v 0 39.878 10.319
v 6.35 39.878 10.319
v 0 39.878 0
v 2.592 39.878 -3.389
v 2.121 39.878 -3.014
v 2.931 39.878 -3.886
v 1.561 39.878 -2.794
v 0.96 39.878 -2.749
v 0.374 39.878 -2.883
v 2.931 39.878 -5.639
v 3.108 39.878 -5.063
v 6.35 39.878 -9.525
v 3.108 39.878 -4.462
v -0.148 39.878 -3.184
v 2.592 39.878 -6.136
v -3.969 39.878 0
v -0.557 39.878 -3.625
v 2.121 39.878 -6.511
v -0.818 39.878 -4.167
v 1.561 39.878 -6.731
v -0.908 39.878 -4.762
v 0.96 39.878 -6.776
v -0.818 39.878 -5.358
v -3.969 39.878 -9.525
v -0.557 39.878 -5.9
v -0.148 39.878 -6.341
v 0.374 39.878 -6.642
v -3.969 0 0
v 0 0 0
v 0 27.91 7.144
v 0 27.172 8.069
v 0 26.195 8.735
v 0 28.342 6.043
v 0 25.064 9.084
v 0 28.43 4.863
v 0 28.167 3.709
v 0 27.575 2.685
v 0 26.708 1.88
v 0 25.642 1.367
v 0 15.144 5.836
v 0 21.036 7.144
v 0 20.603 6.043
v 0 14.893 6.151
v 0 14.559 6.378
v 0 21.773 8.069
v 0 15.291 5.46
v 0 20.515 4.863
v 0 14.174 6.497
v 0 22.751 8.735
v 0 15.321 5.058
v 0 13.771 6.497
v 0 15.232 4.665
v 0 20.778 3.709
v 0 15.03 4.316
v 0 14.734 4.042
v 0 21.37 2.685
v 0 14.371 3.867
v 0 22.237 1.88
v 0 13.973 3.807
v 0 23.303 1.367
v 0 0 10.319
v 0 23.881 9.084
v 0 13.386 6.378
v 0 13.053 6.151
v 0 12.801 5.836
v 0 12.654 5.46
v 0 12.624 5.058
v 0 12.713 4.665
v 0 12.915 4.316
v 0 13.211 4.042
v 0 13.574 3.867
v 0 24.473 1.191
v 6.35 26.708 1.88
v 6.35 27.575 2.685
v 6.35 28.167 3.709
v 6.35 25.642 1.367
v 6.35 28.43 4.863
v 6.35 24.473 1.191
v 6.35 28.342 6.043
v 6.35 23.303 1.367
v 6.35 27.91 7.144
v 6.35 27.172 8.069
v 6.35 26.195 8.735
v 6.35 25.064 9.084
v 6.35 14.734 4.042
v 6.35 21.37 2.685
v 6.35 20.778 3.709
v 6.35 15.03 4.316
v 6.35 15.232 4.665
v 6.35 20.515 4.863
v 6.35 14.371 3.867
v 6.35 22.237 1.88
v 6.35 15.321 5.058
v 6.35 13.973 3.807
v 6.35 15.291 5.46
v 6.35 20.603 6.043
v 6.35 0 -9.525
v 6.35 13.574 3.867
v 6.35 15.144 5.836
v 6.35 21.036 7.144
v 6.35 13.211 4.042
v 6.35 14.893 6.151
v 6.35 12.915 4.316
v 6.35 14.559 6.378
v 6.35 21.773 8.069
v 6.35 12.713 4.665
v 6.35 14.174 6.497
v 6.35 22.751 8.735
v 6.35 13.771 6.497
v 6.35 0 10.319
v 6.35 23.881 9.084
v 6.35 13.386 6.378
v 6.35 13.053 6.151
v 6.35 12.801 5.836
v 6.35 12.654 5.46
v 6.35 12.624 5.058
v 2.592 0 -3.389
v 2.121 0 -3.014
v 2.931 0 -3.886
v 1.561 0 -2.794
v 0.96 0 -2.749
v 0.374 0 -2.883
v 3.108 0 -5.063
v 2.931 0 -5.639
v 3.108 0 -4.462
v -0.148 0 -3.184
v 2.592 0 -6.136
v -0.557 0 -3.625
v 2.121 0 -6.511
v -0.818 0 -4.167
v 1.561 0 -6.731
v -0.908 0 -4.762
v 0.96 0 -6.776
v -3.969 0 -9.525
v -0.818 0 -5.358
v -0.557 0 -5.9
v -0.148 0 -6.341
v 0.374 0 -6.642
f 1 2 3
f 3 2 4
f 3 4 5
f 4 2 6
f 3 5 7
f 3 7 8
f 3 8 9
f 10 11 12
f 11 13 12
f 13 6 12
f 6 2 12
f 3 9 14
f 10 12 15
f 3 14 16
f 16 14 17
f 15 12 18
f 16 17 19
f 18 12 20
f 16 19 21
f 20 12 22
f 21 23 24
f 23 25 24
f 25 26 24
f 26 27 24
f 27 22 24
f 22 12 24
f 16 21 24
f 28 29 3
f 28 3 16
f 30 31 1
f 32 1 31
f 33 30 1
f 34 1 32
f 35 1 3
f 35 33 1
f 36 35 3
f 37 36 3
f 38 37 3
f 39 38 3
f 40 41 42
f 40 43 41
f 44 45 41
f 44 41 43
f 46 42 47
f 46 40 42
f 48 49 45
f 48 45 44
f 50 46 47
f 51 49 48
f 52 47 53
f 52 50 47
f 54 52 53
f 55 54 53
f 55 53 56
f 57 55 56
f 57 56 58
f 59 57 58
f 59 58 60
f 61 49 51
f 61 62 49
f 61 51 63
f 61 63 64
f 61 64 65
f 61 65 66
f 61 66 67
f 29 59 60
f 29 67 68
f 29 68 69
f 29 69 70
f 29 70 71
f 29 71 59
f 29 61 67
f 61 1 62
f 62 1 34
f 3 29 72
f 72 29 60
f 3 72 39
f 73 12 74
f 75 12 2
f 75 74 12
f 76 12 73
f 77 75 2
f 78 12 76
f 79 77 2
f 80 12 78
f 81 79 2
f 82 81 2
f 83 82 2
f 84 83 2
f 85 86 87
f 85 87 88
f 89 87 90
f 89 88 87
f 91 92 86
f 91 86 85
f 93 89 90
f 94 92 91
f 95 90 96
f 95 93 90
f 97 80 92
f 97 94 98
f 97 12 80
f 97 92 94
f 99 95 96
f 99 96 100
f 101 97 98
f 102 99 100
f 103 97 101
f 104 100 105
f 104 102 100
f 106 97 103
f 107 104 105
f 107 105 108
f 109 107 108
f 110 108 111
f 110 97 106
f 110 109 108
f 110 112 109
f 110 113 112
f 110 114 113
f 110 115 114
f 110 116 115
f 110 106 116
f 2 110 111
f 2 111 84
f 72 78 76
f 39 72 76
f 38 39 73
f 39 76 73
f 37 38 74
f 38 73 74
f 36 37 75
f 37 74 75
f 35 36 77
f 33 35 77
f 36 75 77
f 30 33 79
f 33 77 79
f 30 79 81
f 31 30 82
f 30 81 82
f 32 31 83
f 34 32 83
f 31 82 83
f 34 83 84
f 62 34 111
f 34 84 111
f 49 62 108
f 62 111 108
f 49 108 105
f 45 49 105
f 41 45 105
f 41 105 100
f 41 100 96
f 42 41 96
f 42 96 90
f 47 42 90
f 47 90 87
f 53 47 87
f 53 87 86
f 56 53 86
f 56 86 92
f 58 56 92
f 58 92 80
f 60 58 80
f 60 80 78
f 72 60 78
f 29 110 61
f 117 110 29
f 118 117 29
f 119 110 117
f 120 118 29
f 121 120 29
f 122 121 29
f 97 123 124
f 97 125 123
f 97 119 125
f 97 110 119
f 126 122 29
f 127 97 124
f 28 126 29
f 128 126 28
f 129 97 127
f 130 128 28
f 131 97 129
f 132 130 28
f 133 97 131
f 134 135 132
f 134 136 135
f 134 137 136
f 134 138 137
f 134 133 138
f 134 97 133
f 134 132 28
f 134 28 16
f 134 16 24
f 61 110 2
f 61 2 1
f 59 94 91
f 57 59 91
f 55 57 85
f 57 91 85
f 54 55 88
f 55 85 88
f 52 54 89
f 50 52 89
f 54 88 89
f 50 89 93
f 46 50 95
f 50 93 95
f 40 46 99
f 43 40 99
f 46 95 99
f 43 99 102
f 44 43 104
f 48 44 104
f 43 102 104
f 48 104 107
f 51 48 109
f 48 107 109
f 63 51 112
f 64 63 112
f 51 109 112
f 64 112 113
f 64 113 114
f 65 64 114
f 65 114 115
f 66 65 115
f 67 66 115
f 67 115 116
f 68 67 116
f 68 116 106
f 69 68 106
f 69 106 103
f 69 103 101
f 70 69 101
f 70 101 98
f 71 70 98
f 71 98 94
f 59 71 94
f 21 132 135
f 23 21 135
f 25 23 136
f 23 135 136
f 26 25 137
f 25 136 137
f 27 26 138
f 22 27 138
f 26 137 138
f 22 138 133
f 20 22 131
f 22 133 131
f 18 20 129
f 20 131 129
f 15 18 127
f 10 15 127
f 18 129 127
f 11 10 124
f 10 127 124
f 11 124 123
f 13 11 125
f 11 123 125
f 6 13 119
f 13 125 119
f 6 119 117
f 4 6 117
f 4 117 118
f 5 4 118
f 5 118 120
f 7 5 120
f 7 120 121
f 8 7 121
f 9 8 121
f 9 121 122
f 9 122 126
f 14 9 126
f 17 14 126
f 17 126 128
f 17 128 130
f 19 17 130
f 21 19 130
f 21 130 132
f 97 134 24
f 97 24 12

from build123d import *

# Parameters (mm, degrees)
BOSS_EXTRUDE1_DEPTH        = 39.878
F_10_32_TAPPED_HOLE1_D     = 4.0386
F_10_32_TAPPED_HOLE1_DEPTH = 39.878
F_6_32_TAPPED_HOLE1_D      = 2.7051
F_6_32_TAPPED_HOLE1_DEPTH  = 6.35
CUT_EXTRUDE1_REACH         = 12.319
SKETCH10_R                 = 3.96875


with BuildPart() as part:
    # Sketch1 → Boss-Extrude1 (new body)
    with BuildSketch(Plane(origin=(0, 0, 0), x_dir=(1, 0, 0), z_dir=(0, 1, 0))):
        Polygon((0, 0), (-3.96875, 0), (-3.96875, 9.525), (6.35, 9.525), (6.35, -10.31875), (0, -10.31875), align=None)
    extrude(amount=BOSS_EXTRUDE1_DEPTH)

    # #10-32 Tapped Hole1
    with Locations(Plane(origin=(0, 39.878, 0), x_dir=(1, 0, 0), z_dir=(0, 1, 0))):
        with Locations((1.11125, 4.7625)):
            Hole(F_10_32_TAPPED_HOLE1_D / 2, depth=F_10_32_TAPPED_HOLE1_DEPTH)

    # #6-32 Tapped Hole1
    with Locations(Plane.ZY):
        with Locations((5.159375, 13.97254)):
            Hole(F_6_32_TAPPED_HOLE1_D / 2, depth=F_6_32_TAPPED_HOLE1_DEPTH)

    # Sketch10 → Cut-Extrude1 (cut, up to next)
    with BuildSketch(Plane(origin=(6.35, 0, 0), x_dir=(0, 0, -1), z_dir=(1, 0, 0)), mode=Mode.PRIVATE) as cut_extrude1_sk1:
        with Locations((-5.159375, 24.47254)):
            Circle(SKETCH10_R)
    cut_extrude1_tool1 = extrude(cut_extrude1_sk1.sketch, amount=-CUT_EXTRUDE1_REACH, mode=Mode.PRIVATE) & part.part
    add(cut_extrude1_tool1.solids().sort_by_distance((6.35, 24.47254, 5.159375))[0], mode=Mode.SUBTRACT)


solid = part.part
